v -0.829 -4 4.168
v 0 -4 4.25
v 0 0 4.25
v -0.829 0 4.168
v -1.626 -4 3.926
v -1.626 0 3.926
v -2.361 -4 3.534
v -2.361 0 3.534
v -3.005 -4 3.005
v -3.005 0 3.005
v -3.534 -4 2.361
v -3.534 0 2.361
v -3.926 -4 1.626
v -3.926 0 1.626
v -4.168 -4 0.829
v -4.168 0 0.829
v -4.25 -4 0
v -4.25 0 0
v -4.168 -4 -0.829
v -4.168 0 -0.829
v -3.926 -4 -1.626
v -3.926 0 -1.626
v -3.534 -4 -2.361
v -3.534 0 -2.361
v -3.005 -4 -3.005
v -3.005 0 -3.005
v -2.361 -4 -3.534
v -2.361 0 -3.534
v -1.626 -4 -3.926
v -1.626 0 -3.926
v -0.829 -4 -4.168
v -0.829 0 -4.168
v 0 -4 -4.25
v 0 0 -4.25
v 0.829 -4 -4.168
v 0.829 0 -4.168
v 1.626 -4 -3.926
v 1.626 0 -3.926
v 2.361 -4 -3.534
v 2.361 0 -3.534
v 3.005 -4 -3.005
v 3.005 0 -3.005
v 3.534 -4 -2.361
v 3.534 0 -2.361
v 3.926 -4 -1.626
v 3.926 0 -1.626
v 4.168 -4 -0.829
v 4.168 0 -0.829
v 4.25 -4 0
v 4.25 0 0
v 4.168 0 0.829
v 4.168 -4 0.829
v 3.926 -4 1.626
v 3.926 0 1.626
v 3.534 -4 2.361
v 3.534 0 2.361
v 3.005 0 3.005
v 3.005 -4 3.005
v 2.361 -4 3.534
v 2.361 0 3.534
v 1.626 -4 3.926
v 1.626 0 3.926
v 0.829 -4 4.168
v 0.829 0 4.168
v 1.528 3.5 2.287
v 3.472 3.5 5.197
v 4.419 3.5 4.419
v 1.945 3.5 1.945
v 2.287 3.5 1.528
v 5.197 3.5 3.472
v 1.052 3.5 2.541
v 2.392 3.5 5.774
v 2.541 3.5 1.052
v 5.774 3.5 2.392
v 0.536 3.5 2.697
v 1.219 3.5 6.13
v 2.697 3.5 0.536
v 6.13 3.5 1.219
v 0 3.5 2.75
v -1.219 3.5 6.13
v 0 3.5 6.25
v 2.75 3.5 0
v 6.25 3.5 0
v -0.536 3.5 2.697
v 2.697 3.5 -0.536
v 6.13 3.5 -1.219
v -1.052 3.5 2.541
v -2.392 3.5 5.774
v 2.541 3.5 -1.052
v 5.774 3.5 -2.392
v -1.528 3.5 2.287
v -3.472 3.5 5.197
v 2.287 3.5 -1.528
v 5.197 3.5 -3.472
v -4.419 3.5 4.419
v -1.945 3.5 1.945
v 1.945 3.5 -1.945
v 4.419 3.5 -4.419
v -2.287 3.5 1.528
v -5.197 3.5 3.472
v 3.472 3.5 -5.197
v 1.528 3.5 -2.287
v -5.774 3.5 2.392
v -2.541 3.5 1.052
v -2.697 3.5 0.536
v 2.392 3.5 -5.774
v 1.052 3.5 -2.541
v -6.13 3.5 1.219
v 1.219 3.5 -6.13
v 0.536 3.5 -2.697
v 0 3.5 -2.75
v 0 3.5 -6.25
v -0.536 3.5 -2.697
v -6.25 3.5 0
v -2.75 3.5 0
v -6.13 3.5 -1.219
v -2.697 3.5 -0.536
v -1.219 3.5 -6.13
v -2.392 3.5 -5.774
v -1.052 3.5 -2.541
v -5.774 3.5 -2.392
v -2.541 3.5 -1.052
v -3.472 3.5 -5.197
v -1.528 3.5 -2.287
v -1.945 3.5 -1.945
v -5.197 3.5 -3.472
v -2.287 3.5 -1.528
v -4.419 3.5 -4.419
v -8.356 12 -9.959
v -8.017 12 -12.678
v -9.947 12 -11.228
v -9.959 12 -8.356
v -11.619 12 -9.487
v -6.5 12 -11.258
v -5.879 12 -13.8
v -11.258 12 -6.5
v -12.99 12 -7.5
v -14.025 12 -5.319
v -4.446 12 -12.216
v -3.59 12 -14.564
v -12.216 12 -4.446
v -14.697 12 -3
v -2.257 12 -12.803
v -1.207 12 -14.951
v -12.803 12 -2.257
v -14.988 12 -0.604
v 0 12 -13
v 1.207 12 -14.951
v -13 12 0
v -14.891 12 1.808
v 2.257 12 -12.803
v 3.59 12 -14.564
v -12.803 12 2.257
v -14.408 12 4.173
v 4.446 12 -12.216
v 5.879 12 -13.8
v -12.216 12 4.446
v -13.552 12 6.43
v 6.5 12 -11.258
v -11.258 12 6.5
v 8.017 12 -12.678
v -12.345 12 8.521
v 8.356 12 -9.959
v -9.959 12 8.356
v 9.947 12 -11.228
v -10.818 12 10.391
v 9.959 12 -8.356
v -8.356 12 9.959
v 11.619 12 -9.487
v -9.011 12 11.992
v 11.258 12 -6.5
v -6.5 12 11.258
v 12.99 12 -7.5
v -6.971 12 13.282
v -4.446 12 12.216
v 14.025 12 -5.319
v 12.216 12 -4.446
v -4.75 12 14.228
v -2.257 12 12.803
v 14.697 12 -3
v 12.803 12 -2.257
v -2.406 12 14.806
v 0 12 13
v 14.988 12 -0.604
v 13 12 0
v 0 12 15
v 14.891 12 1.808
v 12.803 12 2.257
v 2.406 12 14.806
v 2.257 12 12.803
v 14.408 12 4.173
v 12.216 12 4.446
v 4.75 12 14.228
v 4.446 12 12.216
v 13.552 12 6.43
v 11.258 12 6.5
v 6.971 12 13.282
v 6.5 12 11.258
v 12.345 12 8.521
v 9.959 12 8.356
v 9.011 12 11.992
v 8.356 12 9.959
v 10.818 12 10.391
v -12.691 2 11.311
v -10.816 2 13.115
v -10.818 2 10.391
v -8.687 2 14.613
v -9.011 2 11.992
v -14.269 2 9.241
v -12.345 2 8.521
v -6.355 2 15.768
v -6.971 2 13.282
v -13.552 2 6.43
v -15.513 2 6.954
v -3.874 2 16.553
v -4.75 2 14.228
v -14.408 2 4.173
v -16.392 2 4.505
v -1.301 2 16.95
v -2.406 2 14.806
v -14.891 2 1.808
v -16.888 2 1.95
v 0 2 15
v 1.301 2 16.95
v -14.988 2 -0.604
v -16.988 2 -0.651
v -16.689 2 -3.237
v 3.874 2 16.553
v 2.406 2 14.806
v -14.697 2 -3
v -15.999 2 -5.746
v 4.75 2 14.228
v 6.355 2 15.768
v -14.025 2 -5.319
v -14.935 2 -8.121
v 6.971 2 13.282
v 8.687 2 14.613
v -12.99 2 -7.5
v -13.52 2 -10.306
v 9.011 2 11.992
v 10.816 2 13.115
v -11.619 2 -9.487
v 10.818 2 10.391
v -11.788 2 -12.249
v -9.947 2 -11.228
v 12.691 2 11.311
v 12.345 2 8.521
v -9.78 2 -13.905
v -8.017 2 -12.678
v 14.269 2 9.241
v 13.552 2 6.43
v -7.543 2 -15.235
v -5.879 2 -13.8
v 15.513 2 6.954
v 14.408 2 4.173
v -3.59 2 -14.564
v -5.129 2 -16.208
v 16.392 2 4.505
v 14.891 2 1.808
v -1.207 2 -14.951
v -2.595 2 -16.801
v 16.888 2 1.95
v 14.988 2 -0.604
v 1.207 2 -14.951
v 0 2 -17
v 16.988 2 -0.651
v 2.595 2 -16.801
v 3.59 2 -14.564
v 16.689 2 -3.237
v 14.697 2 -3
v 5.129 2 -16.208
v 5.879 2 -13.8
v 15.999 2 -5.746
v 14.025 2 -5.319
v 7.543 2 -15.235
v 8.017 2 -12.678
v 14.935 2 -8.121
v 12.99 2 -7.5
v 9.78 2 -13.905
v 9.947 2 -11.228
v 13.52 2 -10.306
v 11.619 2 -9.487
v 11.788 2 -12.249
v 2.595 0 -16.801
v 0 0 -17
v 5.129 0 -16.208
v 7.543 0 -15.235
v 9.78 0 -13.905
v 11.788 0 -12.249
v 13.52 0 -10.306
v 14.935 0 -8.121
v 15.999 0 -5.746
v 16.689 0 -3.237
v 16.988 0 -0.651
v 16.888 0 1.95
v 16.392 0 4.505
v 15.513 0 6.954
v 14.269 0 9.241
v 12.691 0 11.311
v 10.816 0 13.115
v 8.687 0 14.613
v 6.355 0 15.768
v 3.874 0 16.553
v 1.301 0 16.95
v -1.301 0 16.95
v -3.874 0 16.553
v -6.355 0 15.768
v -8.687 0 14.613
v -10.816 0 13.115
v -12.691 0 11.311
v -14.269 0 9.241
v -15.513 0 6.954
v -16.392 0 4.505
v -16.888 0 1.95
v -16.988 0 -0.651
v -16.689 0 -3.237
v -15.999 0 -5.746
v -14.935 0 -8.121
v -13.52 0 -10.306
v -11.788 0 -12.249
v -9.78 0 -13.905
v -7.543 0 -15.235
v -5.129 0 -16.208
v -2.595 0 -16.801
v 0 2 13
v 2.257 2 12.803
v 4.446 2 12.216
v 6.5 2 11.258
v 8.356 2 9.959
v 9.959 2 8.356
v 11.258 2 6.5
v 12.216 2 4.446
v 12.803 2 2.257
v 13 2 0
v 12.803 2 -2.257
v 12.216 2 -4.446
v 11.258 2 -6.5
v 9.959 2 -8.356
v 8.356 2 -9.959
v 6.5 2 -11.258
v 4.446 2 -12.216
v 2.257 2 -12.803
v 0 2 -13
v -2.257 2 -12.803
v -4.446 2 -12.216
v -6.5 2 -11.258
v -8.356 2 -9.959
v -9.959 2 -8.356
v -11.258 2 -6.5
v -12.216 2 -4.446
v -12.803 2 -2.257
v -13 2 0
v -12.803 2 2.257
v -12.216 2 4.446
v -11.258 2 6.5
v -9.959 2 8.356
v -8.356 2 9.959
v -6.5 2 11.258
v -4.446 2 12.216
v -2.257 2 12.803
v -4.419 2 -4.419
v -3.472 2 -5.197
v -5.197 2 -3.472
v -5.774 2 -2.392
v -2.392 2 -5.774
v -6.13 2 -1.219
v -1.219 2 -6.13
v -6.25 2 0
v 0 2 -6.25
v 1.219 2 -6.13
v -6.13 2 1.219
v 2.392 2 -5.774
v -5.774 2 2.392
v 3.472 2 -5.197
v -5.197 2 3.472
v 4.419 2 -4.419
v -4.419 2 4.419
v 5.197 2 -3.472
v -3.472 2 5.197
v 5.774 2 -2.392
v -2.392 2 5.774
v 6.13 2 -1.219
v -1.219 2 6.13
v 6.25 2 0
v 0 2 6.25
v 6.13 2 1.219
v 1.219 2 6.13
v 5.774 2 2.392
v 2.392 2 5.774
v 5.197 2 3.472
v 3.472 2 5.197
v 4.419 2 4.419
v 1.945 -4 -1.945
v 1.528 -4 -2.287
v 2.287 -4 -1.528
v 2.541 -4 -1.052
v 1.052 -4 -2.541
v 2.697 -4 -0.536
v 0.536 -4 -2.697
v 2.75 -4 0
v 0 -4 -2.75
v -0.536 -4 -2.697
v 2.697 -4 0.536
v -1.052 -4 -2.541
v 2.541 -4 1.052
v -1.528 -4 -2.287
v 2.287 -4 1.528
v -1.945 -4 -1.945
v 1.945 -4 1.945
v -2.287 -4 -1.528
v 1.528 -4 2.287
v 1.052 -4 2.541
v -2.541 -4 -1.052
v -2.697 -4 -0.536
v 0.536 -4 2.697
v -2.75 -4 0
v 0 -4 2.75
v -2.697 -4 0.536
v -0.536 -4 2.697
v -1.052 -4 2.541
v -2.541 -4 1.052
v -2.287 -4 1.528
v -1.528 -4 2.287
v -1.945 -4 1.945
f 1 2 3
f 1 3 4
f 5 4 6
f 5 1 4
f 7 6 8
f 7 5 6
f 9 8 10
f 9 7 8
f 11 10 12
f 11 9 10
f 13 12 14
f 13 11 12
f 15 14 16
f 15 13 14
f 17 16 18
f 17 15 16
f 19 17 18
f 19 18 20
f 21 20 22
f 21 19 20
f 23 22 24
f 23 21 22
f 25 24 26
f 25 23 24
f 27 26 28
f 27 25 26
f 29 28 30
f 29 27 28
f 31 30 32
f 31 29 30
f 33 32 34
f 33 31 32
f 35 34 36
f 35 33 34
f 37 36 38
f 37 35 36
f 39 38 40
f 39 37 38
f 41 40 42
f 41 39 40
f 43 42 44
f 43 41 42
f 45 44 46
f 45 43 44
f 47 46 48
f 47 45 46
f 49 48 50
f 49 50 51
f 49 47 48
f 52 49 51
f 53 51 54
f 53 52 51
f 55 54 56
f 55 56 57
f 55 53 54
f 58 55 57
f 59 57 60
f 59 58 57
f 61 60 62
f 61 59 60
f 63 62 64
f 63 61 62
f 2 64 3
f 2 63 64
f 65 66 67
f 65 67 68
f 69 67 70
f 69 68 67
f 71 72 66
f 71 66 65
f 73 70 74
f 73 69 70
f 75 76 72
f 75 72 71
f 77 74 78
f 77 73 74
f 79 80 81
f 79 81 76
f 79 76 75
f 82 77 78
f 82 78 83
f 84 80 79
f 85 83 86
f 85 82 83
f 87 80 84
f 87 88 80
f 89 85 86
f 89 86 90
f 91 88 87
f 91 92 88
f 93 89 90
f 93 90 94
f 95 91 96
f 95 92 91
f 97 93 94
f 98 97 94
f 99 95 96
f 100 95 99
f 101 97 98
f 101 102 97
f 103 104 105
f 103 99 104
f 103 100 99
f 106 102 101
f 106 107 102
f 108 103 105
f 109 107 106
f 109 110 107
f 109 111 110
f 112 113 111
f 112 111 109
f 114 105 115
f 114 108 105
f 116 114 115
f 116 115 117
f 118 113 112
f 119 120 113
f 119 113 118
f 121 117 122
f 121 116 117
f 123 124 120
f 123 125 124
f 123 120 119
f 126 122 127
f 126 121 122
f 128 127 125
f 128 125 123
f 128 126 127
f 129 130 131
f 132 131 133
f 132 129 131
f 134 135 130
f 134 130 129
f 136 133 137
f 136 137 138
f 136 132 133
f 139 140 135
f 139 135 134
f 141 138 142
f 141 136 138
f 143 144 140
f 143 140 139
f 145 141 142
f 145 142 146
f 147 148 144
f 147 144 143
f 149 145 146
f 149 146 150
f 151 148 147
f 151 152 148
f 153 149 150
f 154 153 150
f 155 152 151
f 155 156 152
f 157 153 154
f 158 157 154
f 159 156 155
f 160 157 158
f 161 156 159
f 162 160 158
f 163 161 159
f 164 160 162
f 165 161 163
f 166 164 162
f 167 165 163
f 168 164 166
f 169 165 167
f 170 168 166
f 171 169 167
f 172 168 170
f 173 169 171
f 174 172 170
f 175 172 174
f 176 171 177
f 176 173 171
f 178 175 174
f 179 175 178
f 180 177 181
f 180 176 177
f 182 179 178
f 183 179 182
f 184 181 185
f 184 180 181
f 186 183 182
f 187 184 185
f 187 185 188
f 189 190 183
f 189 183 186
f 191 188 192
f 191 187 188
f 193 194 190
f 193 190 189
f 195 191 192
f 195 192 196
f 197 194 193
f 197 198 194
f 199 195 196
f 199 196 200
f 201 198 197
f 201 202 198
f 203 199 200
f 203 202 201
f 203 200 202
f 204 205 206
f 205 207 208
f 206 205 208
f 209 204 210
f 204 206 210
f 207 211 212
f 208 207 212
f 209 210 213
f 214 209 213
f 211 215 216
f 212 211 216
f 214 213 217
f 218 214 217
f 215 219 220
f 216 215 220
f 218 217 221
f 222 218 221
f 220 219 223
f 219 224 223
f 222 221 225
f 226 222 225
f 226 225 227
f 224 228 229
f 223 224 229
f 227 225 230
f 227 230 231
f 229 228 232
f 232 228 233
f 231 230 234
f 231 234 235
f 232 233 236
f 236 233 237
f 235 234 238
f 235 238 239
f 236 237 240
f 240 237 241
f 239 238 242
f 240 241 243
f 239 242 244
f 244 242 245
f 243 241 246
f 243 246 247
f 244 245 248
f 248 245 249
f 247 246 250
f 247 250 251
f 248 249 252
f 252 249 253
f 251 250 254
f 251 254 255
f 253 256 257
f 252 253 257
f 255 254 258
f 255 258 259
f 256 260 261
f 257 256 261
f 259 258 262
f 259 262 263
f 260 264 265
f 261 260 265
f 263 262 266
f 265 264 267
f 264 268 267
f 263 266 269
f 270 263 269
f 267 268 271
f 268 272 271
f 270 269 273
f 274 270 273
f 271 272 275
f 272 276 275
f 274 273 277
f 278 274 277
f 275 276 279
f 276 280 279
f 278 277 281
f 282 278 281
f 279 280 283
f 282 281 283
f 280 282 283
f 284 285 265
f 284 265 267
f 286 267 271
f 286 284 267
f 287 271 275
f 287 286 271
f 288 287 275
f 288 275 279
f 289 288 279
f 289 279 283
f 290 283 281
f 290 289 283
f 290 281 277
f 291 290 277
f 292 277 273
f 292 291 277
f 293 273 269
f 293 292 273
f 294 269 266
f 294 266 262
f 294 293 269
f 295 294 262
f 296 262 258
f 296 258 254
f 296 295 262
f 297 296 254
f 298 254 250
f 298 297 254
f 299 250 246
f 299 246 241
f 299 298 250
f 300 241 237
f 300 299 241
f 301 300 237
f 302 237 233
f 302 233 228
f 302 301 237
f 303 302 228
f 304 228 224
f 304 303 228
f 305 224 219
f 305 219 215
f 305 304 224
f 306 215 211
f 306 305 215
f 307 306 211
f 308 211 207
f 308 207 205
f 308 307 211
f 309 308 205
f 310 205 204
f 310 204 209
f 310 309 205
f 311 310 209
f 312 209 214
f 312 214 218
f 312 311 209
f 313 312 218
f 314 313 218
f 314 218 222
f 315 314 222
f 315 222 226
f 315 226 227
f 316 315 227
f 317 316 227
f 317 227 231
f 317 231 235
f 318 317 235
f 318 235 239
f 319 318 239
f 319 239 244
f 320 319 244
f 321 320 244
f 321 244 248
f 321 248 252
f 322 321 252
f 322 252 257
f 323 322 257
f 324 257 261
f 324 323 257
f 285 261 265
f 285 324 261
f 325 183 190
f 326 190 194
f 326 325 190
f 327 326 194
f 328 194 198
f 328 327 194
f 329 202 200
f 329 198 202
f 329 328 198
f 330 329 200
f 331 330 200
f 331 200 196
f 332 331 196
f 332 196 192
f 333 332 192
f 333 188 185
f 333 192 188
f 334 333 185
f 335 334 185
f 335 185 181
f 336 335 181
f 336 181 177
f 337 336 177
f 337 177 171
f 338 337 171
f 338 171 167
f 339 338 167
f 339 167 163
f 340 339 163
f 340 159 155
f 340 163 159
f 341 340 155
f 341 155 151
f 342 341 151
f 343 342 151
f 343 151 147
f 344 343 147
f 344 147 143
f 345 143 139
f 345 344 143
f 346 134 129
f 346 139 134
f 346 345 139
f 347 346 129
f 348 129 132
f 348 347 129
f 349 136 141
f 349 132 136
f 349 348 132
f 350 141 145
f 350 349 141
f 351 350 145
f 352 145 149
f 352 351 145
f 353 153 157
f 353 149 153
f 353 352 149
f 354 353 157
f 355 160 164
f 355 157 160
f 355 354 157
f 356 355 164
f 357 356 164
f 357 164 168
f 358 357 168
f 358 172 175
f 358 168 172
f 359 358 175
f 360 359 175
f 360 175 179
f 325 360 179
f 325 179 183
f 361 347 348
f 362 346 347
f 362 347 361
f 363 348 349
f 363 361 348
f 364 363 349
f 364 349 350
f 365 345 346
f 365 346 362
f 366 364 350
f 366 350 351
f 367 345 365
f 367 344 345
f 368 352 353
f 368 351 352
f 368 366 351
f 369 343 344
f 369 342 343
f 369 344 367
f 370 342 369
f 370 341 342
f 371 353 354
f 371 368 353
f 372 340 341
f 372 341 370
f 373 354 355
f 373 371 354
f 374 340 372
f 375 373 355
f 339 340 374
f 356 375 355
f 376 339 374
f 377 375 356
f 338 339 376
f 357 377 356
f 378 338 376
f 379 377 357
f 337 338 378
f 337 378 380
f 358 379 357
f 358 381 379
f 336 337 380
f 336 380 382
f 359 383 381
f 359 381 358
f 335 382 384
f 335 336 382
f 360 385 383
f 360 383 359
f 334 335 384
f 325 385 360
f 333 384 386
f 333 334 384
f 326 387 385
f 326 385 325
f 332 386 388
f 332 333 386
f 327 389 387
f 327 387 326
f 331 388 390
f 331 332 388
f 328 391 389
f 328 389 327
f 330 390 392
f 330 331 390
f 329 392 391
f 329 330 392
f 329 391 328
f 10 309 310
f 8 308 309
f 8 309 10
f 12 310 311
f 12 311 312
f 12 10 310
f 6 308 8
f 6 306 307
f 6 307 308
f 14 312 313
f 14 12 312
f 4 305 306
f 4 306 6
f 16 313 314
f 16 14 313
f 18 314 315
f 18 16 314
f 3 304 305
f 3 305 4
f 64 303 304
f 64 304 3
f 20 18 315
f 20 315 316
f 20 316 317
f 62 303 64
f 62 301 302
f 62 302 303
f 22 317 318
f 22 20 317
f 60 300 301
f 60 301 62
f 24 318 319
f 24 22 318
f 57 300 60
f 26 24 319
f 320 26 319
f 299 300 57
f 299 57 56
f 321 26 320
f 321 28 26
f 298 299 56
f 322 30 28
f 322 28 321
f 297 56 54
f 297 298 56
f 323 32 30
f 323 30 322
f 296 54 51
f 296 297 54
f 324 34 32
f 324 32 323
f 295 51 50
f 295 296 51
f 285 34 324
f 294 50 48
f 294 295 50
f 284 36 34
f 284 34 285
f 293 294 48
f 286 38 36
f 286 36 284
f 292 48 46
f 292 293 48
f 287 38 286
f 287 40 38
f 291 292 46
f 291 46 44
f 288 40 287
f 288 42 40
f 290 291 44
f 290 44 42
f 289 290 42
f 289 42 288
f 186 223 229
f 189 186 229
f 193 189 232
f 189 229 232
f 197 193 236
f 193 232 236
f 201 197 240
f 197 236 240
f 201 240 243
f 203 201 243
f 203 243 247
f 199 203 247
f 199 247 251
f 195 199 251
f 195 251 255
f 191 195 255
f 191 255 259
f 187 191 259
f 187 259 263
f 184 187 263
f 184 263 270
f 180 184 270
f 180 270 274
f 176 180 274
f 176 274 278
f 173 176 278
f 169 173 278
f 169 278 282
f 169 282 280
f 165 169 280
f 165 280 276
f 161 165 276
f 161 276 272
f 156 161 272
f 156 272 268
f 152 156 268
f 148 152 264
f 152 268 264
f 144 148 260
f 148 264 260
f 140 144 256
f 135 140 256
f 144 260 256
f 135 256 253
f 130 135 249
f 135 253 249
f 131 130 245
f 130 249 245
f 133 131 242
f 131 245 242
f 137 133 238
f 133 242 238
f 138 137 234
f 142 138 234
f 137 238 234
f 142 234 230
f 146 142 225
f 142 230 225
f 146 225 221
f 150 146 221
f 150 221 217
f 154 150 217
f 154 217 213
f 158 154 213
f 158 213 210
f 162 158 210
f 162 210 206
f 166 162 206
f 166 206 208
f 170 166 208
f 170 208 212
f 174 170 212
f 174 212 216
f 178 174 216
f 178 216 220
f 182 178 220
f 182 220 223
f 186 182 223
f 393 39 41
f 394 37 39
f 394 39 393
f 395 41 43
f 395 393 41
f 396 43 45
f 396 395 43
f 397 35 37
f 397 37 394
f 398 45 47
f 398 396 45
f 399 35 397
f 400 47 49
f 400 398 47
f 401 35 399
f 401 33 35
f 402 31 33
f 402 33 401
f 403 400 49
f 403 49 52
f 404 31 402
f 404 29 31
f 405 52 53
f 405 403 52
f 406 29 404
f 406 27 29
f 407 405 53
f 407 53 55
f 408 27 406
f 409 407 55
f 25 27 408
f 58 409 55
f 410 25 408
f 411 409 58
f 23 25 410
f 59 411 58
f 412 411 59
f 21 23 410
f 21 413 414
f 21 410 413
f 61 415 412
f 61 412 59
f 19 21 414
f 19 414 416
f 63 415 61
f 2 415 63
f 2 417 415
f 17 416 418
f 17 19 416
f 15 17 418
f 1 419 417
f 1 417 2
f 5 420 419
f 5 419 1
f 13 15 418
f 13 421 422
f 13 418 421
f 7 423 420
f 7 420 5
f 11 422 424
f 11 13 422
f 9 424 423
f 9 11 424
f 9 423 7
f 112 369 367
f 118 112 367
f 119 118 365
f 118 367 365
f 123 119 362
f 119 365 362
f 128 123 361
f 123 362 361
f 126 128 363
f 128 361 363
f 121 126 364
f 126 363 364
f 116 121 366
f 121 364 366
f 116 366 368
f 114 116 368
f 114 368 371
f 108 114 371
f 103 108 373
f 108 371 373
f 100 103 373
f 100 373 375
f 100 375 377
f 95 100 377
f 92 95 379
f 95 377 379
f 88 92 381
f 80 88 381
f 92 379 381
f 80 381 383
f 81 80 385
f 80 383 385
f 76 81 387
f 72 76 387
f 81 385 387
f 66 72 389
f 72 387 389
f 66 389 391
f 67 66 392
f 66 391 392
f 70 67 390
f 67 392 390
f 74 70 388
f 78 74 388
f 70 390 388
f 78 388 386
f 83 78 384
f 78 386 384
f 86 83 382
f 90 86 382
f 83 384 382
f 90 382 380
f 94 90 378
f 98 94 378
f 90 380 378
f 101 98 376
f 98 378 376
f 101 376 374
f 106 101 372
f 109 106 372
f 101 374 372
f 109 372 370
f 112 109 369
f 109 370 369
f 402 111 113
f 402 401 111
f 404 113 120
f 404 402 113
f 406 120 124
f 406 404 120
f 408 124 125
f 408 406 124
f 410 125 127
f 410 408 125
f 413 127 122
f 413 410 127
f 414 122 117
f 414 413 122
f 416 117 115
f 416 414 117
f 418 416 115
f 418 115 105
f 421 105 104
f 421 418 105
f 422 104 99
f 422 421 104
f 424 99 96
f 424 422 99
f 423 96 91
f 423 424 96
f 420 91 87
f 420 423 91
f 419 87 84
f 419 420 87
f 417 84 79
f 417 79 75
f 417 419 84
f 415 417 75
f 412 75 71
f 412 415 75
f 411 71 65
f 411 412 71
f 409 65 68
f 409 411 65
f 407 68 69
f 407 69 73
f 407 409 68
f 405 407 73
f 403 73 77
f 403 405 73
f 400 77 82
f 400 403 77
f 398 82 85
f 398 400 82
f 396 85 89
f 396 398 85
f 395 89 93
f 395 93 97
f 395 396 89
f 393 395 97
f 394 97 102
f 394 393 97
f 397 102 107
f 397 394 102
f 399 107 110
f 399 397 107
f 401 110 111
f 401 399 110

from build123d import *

# Parameters (mm, degrees)
SKETCH2_R           = 15
BOSS_EXTRUDE1_DEPTH = 12
SHELL1_T            = -2
SKETCH4_R           = 2.75
CUT_EXTRUDE1_DEPTH  = 25.372115214
SKETCH5_R           = 17
SKETCH5_R_2         = 15
BOSS_EXTRUDE3_DEPTH = 2
BOSS_EXTRUDE5_START = 4
SKETCH7_R           = 4.25
SKETCH7_R_2         = 2.75
BOSS_EXTRUDE5_DEPTH = 4
SKETCH6_R           = 6.25
SKETCH6_R_2         = 2.75
BOSS_EXTRUDE4_DEPTH = 1.5


with BuildPart() as part:
    # Sketch2 → Boss-Extrude1 (new body)
    with BuildSketch(Plane(origin=(0, 0, 0), x_dir=(1, 0, 0), z_dir=(0, 1, 0))):
        with Locations(Location((0, 0, 0), (0, 0, 270))):
            Circle(SKETCH2_R)
    extrude(amount=BOSS_EXTRUDE1_DEPTH)

    # Shell1
    shell1_openings = [part.faces().sort_by_distance(p)[0] for p in [
        (0, 12, 0),
    ]]
    offset(amount=SHELL1_T, openings=shell1_openings, kind=Kind.INTERSECTION)

    # Sketch4 → Cut-Extrude1 (cut, through all)
    with BuildSketch(Plane.XZ):
        with Locations(Location((0, 0, 0), (0, 0, 270))):
            Circle(SKETCH4_R)
    extrude(amount=-CUT_EXTRUDE1_DEPTH, mode=Mode.SUBTRACT)

    # Sketch5 → Boss-Extrude3 (add)
    with BuildSketch(Plane.XZ):
        with Locations(Location((0, 0, 0), (0, 0, 270))):
            Circle(SKETCH5_R)
        with Locations(Location((0, 0, 0), (0, 0, 270))):
            Circle(SKETCH5_R_2, mode=Mode.SUBTRACT)
    extrude(amount=-BOSS_EXTRUDE3_DEPTH)

    # Sketch7 → Boss-Extrude5 (add)
    with BuildSketch(Plane.XZ.offset(BOSS_EXTRUDE5_START)):
        with Locations(Location((0, 0, 0), (0, 0, 90))):
            Circle(SKETCH7_R)
        with Locations(Location((0, 0, 0), (0, 0, 270))):
            Circle(SKETCH7_R_2, mode=Mode.SUBTRACT)
    extrude(amount=-BOSS_EXTRUDE5_DEPTH)

    # Sketch6 → Boss-Extrude4 (add)
    with BuildSketch(Plane(origin=(0, 2, 0), x_dir=(1, 0, 0), z_dir=(0, 1, 0))):
        with Locations(Location((0, 0, 0), (0, 0, 90))):
            Circle(SKETCH6_R)
        with Locations(Location((0, 0, 0), (0, 0, 90))):
            Circle(SKETCH6_R_2, mode=Mode.SUBTRACT)
    extrude(amount=BOSS_EXTRUDE4_DEPTH)


solid = part.part
